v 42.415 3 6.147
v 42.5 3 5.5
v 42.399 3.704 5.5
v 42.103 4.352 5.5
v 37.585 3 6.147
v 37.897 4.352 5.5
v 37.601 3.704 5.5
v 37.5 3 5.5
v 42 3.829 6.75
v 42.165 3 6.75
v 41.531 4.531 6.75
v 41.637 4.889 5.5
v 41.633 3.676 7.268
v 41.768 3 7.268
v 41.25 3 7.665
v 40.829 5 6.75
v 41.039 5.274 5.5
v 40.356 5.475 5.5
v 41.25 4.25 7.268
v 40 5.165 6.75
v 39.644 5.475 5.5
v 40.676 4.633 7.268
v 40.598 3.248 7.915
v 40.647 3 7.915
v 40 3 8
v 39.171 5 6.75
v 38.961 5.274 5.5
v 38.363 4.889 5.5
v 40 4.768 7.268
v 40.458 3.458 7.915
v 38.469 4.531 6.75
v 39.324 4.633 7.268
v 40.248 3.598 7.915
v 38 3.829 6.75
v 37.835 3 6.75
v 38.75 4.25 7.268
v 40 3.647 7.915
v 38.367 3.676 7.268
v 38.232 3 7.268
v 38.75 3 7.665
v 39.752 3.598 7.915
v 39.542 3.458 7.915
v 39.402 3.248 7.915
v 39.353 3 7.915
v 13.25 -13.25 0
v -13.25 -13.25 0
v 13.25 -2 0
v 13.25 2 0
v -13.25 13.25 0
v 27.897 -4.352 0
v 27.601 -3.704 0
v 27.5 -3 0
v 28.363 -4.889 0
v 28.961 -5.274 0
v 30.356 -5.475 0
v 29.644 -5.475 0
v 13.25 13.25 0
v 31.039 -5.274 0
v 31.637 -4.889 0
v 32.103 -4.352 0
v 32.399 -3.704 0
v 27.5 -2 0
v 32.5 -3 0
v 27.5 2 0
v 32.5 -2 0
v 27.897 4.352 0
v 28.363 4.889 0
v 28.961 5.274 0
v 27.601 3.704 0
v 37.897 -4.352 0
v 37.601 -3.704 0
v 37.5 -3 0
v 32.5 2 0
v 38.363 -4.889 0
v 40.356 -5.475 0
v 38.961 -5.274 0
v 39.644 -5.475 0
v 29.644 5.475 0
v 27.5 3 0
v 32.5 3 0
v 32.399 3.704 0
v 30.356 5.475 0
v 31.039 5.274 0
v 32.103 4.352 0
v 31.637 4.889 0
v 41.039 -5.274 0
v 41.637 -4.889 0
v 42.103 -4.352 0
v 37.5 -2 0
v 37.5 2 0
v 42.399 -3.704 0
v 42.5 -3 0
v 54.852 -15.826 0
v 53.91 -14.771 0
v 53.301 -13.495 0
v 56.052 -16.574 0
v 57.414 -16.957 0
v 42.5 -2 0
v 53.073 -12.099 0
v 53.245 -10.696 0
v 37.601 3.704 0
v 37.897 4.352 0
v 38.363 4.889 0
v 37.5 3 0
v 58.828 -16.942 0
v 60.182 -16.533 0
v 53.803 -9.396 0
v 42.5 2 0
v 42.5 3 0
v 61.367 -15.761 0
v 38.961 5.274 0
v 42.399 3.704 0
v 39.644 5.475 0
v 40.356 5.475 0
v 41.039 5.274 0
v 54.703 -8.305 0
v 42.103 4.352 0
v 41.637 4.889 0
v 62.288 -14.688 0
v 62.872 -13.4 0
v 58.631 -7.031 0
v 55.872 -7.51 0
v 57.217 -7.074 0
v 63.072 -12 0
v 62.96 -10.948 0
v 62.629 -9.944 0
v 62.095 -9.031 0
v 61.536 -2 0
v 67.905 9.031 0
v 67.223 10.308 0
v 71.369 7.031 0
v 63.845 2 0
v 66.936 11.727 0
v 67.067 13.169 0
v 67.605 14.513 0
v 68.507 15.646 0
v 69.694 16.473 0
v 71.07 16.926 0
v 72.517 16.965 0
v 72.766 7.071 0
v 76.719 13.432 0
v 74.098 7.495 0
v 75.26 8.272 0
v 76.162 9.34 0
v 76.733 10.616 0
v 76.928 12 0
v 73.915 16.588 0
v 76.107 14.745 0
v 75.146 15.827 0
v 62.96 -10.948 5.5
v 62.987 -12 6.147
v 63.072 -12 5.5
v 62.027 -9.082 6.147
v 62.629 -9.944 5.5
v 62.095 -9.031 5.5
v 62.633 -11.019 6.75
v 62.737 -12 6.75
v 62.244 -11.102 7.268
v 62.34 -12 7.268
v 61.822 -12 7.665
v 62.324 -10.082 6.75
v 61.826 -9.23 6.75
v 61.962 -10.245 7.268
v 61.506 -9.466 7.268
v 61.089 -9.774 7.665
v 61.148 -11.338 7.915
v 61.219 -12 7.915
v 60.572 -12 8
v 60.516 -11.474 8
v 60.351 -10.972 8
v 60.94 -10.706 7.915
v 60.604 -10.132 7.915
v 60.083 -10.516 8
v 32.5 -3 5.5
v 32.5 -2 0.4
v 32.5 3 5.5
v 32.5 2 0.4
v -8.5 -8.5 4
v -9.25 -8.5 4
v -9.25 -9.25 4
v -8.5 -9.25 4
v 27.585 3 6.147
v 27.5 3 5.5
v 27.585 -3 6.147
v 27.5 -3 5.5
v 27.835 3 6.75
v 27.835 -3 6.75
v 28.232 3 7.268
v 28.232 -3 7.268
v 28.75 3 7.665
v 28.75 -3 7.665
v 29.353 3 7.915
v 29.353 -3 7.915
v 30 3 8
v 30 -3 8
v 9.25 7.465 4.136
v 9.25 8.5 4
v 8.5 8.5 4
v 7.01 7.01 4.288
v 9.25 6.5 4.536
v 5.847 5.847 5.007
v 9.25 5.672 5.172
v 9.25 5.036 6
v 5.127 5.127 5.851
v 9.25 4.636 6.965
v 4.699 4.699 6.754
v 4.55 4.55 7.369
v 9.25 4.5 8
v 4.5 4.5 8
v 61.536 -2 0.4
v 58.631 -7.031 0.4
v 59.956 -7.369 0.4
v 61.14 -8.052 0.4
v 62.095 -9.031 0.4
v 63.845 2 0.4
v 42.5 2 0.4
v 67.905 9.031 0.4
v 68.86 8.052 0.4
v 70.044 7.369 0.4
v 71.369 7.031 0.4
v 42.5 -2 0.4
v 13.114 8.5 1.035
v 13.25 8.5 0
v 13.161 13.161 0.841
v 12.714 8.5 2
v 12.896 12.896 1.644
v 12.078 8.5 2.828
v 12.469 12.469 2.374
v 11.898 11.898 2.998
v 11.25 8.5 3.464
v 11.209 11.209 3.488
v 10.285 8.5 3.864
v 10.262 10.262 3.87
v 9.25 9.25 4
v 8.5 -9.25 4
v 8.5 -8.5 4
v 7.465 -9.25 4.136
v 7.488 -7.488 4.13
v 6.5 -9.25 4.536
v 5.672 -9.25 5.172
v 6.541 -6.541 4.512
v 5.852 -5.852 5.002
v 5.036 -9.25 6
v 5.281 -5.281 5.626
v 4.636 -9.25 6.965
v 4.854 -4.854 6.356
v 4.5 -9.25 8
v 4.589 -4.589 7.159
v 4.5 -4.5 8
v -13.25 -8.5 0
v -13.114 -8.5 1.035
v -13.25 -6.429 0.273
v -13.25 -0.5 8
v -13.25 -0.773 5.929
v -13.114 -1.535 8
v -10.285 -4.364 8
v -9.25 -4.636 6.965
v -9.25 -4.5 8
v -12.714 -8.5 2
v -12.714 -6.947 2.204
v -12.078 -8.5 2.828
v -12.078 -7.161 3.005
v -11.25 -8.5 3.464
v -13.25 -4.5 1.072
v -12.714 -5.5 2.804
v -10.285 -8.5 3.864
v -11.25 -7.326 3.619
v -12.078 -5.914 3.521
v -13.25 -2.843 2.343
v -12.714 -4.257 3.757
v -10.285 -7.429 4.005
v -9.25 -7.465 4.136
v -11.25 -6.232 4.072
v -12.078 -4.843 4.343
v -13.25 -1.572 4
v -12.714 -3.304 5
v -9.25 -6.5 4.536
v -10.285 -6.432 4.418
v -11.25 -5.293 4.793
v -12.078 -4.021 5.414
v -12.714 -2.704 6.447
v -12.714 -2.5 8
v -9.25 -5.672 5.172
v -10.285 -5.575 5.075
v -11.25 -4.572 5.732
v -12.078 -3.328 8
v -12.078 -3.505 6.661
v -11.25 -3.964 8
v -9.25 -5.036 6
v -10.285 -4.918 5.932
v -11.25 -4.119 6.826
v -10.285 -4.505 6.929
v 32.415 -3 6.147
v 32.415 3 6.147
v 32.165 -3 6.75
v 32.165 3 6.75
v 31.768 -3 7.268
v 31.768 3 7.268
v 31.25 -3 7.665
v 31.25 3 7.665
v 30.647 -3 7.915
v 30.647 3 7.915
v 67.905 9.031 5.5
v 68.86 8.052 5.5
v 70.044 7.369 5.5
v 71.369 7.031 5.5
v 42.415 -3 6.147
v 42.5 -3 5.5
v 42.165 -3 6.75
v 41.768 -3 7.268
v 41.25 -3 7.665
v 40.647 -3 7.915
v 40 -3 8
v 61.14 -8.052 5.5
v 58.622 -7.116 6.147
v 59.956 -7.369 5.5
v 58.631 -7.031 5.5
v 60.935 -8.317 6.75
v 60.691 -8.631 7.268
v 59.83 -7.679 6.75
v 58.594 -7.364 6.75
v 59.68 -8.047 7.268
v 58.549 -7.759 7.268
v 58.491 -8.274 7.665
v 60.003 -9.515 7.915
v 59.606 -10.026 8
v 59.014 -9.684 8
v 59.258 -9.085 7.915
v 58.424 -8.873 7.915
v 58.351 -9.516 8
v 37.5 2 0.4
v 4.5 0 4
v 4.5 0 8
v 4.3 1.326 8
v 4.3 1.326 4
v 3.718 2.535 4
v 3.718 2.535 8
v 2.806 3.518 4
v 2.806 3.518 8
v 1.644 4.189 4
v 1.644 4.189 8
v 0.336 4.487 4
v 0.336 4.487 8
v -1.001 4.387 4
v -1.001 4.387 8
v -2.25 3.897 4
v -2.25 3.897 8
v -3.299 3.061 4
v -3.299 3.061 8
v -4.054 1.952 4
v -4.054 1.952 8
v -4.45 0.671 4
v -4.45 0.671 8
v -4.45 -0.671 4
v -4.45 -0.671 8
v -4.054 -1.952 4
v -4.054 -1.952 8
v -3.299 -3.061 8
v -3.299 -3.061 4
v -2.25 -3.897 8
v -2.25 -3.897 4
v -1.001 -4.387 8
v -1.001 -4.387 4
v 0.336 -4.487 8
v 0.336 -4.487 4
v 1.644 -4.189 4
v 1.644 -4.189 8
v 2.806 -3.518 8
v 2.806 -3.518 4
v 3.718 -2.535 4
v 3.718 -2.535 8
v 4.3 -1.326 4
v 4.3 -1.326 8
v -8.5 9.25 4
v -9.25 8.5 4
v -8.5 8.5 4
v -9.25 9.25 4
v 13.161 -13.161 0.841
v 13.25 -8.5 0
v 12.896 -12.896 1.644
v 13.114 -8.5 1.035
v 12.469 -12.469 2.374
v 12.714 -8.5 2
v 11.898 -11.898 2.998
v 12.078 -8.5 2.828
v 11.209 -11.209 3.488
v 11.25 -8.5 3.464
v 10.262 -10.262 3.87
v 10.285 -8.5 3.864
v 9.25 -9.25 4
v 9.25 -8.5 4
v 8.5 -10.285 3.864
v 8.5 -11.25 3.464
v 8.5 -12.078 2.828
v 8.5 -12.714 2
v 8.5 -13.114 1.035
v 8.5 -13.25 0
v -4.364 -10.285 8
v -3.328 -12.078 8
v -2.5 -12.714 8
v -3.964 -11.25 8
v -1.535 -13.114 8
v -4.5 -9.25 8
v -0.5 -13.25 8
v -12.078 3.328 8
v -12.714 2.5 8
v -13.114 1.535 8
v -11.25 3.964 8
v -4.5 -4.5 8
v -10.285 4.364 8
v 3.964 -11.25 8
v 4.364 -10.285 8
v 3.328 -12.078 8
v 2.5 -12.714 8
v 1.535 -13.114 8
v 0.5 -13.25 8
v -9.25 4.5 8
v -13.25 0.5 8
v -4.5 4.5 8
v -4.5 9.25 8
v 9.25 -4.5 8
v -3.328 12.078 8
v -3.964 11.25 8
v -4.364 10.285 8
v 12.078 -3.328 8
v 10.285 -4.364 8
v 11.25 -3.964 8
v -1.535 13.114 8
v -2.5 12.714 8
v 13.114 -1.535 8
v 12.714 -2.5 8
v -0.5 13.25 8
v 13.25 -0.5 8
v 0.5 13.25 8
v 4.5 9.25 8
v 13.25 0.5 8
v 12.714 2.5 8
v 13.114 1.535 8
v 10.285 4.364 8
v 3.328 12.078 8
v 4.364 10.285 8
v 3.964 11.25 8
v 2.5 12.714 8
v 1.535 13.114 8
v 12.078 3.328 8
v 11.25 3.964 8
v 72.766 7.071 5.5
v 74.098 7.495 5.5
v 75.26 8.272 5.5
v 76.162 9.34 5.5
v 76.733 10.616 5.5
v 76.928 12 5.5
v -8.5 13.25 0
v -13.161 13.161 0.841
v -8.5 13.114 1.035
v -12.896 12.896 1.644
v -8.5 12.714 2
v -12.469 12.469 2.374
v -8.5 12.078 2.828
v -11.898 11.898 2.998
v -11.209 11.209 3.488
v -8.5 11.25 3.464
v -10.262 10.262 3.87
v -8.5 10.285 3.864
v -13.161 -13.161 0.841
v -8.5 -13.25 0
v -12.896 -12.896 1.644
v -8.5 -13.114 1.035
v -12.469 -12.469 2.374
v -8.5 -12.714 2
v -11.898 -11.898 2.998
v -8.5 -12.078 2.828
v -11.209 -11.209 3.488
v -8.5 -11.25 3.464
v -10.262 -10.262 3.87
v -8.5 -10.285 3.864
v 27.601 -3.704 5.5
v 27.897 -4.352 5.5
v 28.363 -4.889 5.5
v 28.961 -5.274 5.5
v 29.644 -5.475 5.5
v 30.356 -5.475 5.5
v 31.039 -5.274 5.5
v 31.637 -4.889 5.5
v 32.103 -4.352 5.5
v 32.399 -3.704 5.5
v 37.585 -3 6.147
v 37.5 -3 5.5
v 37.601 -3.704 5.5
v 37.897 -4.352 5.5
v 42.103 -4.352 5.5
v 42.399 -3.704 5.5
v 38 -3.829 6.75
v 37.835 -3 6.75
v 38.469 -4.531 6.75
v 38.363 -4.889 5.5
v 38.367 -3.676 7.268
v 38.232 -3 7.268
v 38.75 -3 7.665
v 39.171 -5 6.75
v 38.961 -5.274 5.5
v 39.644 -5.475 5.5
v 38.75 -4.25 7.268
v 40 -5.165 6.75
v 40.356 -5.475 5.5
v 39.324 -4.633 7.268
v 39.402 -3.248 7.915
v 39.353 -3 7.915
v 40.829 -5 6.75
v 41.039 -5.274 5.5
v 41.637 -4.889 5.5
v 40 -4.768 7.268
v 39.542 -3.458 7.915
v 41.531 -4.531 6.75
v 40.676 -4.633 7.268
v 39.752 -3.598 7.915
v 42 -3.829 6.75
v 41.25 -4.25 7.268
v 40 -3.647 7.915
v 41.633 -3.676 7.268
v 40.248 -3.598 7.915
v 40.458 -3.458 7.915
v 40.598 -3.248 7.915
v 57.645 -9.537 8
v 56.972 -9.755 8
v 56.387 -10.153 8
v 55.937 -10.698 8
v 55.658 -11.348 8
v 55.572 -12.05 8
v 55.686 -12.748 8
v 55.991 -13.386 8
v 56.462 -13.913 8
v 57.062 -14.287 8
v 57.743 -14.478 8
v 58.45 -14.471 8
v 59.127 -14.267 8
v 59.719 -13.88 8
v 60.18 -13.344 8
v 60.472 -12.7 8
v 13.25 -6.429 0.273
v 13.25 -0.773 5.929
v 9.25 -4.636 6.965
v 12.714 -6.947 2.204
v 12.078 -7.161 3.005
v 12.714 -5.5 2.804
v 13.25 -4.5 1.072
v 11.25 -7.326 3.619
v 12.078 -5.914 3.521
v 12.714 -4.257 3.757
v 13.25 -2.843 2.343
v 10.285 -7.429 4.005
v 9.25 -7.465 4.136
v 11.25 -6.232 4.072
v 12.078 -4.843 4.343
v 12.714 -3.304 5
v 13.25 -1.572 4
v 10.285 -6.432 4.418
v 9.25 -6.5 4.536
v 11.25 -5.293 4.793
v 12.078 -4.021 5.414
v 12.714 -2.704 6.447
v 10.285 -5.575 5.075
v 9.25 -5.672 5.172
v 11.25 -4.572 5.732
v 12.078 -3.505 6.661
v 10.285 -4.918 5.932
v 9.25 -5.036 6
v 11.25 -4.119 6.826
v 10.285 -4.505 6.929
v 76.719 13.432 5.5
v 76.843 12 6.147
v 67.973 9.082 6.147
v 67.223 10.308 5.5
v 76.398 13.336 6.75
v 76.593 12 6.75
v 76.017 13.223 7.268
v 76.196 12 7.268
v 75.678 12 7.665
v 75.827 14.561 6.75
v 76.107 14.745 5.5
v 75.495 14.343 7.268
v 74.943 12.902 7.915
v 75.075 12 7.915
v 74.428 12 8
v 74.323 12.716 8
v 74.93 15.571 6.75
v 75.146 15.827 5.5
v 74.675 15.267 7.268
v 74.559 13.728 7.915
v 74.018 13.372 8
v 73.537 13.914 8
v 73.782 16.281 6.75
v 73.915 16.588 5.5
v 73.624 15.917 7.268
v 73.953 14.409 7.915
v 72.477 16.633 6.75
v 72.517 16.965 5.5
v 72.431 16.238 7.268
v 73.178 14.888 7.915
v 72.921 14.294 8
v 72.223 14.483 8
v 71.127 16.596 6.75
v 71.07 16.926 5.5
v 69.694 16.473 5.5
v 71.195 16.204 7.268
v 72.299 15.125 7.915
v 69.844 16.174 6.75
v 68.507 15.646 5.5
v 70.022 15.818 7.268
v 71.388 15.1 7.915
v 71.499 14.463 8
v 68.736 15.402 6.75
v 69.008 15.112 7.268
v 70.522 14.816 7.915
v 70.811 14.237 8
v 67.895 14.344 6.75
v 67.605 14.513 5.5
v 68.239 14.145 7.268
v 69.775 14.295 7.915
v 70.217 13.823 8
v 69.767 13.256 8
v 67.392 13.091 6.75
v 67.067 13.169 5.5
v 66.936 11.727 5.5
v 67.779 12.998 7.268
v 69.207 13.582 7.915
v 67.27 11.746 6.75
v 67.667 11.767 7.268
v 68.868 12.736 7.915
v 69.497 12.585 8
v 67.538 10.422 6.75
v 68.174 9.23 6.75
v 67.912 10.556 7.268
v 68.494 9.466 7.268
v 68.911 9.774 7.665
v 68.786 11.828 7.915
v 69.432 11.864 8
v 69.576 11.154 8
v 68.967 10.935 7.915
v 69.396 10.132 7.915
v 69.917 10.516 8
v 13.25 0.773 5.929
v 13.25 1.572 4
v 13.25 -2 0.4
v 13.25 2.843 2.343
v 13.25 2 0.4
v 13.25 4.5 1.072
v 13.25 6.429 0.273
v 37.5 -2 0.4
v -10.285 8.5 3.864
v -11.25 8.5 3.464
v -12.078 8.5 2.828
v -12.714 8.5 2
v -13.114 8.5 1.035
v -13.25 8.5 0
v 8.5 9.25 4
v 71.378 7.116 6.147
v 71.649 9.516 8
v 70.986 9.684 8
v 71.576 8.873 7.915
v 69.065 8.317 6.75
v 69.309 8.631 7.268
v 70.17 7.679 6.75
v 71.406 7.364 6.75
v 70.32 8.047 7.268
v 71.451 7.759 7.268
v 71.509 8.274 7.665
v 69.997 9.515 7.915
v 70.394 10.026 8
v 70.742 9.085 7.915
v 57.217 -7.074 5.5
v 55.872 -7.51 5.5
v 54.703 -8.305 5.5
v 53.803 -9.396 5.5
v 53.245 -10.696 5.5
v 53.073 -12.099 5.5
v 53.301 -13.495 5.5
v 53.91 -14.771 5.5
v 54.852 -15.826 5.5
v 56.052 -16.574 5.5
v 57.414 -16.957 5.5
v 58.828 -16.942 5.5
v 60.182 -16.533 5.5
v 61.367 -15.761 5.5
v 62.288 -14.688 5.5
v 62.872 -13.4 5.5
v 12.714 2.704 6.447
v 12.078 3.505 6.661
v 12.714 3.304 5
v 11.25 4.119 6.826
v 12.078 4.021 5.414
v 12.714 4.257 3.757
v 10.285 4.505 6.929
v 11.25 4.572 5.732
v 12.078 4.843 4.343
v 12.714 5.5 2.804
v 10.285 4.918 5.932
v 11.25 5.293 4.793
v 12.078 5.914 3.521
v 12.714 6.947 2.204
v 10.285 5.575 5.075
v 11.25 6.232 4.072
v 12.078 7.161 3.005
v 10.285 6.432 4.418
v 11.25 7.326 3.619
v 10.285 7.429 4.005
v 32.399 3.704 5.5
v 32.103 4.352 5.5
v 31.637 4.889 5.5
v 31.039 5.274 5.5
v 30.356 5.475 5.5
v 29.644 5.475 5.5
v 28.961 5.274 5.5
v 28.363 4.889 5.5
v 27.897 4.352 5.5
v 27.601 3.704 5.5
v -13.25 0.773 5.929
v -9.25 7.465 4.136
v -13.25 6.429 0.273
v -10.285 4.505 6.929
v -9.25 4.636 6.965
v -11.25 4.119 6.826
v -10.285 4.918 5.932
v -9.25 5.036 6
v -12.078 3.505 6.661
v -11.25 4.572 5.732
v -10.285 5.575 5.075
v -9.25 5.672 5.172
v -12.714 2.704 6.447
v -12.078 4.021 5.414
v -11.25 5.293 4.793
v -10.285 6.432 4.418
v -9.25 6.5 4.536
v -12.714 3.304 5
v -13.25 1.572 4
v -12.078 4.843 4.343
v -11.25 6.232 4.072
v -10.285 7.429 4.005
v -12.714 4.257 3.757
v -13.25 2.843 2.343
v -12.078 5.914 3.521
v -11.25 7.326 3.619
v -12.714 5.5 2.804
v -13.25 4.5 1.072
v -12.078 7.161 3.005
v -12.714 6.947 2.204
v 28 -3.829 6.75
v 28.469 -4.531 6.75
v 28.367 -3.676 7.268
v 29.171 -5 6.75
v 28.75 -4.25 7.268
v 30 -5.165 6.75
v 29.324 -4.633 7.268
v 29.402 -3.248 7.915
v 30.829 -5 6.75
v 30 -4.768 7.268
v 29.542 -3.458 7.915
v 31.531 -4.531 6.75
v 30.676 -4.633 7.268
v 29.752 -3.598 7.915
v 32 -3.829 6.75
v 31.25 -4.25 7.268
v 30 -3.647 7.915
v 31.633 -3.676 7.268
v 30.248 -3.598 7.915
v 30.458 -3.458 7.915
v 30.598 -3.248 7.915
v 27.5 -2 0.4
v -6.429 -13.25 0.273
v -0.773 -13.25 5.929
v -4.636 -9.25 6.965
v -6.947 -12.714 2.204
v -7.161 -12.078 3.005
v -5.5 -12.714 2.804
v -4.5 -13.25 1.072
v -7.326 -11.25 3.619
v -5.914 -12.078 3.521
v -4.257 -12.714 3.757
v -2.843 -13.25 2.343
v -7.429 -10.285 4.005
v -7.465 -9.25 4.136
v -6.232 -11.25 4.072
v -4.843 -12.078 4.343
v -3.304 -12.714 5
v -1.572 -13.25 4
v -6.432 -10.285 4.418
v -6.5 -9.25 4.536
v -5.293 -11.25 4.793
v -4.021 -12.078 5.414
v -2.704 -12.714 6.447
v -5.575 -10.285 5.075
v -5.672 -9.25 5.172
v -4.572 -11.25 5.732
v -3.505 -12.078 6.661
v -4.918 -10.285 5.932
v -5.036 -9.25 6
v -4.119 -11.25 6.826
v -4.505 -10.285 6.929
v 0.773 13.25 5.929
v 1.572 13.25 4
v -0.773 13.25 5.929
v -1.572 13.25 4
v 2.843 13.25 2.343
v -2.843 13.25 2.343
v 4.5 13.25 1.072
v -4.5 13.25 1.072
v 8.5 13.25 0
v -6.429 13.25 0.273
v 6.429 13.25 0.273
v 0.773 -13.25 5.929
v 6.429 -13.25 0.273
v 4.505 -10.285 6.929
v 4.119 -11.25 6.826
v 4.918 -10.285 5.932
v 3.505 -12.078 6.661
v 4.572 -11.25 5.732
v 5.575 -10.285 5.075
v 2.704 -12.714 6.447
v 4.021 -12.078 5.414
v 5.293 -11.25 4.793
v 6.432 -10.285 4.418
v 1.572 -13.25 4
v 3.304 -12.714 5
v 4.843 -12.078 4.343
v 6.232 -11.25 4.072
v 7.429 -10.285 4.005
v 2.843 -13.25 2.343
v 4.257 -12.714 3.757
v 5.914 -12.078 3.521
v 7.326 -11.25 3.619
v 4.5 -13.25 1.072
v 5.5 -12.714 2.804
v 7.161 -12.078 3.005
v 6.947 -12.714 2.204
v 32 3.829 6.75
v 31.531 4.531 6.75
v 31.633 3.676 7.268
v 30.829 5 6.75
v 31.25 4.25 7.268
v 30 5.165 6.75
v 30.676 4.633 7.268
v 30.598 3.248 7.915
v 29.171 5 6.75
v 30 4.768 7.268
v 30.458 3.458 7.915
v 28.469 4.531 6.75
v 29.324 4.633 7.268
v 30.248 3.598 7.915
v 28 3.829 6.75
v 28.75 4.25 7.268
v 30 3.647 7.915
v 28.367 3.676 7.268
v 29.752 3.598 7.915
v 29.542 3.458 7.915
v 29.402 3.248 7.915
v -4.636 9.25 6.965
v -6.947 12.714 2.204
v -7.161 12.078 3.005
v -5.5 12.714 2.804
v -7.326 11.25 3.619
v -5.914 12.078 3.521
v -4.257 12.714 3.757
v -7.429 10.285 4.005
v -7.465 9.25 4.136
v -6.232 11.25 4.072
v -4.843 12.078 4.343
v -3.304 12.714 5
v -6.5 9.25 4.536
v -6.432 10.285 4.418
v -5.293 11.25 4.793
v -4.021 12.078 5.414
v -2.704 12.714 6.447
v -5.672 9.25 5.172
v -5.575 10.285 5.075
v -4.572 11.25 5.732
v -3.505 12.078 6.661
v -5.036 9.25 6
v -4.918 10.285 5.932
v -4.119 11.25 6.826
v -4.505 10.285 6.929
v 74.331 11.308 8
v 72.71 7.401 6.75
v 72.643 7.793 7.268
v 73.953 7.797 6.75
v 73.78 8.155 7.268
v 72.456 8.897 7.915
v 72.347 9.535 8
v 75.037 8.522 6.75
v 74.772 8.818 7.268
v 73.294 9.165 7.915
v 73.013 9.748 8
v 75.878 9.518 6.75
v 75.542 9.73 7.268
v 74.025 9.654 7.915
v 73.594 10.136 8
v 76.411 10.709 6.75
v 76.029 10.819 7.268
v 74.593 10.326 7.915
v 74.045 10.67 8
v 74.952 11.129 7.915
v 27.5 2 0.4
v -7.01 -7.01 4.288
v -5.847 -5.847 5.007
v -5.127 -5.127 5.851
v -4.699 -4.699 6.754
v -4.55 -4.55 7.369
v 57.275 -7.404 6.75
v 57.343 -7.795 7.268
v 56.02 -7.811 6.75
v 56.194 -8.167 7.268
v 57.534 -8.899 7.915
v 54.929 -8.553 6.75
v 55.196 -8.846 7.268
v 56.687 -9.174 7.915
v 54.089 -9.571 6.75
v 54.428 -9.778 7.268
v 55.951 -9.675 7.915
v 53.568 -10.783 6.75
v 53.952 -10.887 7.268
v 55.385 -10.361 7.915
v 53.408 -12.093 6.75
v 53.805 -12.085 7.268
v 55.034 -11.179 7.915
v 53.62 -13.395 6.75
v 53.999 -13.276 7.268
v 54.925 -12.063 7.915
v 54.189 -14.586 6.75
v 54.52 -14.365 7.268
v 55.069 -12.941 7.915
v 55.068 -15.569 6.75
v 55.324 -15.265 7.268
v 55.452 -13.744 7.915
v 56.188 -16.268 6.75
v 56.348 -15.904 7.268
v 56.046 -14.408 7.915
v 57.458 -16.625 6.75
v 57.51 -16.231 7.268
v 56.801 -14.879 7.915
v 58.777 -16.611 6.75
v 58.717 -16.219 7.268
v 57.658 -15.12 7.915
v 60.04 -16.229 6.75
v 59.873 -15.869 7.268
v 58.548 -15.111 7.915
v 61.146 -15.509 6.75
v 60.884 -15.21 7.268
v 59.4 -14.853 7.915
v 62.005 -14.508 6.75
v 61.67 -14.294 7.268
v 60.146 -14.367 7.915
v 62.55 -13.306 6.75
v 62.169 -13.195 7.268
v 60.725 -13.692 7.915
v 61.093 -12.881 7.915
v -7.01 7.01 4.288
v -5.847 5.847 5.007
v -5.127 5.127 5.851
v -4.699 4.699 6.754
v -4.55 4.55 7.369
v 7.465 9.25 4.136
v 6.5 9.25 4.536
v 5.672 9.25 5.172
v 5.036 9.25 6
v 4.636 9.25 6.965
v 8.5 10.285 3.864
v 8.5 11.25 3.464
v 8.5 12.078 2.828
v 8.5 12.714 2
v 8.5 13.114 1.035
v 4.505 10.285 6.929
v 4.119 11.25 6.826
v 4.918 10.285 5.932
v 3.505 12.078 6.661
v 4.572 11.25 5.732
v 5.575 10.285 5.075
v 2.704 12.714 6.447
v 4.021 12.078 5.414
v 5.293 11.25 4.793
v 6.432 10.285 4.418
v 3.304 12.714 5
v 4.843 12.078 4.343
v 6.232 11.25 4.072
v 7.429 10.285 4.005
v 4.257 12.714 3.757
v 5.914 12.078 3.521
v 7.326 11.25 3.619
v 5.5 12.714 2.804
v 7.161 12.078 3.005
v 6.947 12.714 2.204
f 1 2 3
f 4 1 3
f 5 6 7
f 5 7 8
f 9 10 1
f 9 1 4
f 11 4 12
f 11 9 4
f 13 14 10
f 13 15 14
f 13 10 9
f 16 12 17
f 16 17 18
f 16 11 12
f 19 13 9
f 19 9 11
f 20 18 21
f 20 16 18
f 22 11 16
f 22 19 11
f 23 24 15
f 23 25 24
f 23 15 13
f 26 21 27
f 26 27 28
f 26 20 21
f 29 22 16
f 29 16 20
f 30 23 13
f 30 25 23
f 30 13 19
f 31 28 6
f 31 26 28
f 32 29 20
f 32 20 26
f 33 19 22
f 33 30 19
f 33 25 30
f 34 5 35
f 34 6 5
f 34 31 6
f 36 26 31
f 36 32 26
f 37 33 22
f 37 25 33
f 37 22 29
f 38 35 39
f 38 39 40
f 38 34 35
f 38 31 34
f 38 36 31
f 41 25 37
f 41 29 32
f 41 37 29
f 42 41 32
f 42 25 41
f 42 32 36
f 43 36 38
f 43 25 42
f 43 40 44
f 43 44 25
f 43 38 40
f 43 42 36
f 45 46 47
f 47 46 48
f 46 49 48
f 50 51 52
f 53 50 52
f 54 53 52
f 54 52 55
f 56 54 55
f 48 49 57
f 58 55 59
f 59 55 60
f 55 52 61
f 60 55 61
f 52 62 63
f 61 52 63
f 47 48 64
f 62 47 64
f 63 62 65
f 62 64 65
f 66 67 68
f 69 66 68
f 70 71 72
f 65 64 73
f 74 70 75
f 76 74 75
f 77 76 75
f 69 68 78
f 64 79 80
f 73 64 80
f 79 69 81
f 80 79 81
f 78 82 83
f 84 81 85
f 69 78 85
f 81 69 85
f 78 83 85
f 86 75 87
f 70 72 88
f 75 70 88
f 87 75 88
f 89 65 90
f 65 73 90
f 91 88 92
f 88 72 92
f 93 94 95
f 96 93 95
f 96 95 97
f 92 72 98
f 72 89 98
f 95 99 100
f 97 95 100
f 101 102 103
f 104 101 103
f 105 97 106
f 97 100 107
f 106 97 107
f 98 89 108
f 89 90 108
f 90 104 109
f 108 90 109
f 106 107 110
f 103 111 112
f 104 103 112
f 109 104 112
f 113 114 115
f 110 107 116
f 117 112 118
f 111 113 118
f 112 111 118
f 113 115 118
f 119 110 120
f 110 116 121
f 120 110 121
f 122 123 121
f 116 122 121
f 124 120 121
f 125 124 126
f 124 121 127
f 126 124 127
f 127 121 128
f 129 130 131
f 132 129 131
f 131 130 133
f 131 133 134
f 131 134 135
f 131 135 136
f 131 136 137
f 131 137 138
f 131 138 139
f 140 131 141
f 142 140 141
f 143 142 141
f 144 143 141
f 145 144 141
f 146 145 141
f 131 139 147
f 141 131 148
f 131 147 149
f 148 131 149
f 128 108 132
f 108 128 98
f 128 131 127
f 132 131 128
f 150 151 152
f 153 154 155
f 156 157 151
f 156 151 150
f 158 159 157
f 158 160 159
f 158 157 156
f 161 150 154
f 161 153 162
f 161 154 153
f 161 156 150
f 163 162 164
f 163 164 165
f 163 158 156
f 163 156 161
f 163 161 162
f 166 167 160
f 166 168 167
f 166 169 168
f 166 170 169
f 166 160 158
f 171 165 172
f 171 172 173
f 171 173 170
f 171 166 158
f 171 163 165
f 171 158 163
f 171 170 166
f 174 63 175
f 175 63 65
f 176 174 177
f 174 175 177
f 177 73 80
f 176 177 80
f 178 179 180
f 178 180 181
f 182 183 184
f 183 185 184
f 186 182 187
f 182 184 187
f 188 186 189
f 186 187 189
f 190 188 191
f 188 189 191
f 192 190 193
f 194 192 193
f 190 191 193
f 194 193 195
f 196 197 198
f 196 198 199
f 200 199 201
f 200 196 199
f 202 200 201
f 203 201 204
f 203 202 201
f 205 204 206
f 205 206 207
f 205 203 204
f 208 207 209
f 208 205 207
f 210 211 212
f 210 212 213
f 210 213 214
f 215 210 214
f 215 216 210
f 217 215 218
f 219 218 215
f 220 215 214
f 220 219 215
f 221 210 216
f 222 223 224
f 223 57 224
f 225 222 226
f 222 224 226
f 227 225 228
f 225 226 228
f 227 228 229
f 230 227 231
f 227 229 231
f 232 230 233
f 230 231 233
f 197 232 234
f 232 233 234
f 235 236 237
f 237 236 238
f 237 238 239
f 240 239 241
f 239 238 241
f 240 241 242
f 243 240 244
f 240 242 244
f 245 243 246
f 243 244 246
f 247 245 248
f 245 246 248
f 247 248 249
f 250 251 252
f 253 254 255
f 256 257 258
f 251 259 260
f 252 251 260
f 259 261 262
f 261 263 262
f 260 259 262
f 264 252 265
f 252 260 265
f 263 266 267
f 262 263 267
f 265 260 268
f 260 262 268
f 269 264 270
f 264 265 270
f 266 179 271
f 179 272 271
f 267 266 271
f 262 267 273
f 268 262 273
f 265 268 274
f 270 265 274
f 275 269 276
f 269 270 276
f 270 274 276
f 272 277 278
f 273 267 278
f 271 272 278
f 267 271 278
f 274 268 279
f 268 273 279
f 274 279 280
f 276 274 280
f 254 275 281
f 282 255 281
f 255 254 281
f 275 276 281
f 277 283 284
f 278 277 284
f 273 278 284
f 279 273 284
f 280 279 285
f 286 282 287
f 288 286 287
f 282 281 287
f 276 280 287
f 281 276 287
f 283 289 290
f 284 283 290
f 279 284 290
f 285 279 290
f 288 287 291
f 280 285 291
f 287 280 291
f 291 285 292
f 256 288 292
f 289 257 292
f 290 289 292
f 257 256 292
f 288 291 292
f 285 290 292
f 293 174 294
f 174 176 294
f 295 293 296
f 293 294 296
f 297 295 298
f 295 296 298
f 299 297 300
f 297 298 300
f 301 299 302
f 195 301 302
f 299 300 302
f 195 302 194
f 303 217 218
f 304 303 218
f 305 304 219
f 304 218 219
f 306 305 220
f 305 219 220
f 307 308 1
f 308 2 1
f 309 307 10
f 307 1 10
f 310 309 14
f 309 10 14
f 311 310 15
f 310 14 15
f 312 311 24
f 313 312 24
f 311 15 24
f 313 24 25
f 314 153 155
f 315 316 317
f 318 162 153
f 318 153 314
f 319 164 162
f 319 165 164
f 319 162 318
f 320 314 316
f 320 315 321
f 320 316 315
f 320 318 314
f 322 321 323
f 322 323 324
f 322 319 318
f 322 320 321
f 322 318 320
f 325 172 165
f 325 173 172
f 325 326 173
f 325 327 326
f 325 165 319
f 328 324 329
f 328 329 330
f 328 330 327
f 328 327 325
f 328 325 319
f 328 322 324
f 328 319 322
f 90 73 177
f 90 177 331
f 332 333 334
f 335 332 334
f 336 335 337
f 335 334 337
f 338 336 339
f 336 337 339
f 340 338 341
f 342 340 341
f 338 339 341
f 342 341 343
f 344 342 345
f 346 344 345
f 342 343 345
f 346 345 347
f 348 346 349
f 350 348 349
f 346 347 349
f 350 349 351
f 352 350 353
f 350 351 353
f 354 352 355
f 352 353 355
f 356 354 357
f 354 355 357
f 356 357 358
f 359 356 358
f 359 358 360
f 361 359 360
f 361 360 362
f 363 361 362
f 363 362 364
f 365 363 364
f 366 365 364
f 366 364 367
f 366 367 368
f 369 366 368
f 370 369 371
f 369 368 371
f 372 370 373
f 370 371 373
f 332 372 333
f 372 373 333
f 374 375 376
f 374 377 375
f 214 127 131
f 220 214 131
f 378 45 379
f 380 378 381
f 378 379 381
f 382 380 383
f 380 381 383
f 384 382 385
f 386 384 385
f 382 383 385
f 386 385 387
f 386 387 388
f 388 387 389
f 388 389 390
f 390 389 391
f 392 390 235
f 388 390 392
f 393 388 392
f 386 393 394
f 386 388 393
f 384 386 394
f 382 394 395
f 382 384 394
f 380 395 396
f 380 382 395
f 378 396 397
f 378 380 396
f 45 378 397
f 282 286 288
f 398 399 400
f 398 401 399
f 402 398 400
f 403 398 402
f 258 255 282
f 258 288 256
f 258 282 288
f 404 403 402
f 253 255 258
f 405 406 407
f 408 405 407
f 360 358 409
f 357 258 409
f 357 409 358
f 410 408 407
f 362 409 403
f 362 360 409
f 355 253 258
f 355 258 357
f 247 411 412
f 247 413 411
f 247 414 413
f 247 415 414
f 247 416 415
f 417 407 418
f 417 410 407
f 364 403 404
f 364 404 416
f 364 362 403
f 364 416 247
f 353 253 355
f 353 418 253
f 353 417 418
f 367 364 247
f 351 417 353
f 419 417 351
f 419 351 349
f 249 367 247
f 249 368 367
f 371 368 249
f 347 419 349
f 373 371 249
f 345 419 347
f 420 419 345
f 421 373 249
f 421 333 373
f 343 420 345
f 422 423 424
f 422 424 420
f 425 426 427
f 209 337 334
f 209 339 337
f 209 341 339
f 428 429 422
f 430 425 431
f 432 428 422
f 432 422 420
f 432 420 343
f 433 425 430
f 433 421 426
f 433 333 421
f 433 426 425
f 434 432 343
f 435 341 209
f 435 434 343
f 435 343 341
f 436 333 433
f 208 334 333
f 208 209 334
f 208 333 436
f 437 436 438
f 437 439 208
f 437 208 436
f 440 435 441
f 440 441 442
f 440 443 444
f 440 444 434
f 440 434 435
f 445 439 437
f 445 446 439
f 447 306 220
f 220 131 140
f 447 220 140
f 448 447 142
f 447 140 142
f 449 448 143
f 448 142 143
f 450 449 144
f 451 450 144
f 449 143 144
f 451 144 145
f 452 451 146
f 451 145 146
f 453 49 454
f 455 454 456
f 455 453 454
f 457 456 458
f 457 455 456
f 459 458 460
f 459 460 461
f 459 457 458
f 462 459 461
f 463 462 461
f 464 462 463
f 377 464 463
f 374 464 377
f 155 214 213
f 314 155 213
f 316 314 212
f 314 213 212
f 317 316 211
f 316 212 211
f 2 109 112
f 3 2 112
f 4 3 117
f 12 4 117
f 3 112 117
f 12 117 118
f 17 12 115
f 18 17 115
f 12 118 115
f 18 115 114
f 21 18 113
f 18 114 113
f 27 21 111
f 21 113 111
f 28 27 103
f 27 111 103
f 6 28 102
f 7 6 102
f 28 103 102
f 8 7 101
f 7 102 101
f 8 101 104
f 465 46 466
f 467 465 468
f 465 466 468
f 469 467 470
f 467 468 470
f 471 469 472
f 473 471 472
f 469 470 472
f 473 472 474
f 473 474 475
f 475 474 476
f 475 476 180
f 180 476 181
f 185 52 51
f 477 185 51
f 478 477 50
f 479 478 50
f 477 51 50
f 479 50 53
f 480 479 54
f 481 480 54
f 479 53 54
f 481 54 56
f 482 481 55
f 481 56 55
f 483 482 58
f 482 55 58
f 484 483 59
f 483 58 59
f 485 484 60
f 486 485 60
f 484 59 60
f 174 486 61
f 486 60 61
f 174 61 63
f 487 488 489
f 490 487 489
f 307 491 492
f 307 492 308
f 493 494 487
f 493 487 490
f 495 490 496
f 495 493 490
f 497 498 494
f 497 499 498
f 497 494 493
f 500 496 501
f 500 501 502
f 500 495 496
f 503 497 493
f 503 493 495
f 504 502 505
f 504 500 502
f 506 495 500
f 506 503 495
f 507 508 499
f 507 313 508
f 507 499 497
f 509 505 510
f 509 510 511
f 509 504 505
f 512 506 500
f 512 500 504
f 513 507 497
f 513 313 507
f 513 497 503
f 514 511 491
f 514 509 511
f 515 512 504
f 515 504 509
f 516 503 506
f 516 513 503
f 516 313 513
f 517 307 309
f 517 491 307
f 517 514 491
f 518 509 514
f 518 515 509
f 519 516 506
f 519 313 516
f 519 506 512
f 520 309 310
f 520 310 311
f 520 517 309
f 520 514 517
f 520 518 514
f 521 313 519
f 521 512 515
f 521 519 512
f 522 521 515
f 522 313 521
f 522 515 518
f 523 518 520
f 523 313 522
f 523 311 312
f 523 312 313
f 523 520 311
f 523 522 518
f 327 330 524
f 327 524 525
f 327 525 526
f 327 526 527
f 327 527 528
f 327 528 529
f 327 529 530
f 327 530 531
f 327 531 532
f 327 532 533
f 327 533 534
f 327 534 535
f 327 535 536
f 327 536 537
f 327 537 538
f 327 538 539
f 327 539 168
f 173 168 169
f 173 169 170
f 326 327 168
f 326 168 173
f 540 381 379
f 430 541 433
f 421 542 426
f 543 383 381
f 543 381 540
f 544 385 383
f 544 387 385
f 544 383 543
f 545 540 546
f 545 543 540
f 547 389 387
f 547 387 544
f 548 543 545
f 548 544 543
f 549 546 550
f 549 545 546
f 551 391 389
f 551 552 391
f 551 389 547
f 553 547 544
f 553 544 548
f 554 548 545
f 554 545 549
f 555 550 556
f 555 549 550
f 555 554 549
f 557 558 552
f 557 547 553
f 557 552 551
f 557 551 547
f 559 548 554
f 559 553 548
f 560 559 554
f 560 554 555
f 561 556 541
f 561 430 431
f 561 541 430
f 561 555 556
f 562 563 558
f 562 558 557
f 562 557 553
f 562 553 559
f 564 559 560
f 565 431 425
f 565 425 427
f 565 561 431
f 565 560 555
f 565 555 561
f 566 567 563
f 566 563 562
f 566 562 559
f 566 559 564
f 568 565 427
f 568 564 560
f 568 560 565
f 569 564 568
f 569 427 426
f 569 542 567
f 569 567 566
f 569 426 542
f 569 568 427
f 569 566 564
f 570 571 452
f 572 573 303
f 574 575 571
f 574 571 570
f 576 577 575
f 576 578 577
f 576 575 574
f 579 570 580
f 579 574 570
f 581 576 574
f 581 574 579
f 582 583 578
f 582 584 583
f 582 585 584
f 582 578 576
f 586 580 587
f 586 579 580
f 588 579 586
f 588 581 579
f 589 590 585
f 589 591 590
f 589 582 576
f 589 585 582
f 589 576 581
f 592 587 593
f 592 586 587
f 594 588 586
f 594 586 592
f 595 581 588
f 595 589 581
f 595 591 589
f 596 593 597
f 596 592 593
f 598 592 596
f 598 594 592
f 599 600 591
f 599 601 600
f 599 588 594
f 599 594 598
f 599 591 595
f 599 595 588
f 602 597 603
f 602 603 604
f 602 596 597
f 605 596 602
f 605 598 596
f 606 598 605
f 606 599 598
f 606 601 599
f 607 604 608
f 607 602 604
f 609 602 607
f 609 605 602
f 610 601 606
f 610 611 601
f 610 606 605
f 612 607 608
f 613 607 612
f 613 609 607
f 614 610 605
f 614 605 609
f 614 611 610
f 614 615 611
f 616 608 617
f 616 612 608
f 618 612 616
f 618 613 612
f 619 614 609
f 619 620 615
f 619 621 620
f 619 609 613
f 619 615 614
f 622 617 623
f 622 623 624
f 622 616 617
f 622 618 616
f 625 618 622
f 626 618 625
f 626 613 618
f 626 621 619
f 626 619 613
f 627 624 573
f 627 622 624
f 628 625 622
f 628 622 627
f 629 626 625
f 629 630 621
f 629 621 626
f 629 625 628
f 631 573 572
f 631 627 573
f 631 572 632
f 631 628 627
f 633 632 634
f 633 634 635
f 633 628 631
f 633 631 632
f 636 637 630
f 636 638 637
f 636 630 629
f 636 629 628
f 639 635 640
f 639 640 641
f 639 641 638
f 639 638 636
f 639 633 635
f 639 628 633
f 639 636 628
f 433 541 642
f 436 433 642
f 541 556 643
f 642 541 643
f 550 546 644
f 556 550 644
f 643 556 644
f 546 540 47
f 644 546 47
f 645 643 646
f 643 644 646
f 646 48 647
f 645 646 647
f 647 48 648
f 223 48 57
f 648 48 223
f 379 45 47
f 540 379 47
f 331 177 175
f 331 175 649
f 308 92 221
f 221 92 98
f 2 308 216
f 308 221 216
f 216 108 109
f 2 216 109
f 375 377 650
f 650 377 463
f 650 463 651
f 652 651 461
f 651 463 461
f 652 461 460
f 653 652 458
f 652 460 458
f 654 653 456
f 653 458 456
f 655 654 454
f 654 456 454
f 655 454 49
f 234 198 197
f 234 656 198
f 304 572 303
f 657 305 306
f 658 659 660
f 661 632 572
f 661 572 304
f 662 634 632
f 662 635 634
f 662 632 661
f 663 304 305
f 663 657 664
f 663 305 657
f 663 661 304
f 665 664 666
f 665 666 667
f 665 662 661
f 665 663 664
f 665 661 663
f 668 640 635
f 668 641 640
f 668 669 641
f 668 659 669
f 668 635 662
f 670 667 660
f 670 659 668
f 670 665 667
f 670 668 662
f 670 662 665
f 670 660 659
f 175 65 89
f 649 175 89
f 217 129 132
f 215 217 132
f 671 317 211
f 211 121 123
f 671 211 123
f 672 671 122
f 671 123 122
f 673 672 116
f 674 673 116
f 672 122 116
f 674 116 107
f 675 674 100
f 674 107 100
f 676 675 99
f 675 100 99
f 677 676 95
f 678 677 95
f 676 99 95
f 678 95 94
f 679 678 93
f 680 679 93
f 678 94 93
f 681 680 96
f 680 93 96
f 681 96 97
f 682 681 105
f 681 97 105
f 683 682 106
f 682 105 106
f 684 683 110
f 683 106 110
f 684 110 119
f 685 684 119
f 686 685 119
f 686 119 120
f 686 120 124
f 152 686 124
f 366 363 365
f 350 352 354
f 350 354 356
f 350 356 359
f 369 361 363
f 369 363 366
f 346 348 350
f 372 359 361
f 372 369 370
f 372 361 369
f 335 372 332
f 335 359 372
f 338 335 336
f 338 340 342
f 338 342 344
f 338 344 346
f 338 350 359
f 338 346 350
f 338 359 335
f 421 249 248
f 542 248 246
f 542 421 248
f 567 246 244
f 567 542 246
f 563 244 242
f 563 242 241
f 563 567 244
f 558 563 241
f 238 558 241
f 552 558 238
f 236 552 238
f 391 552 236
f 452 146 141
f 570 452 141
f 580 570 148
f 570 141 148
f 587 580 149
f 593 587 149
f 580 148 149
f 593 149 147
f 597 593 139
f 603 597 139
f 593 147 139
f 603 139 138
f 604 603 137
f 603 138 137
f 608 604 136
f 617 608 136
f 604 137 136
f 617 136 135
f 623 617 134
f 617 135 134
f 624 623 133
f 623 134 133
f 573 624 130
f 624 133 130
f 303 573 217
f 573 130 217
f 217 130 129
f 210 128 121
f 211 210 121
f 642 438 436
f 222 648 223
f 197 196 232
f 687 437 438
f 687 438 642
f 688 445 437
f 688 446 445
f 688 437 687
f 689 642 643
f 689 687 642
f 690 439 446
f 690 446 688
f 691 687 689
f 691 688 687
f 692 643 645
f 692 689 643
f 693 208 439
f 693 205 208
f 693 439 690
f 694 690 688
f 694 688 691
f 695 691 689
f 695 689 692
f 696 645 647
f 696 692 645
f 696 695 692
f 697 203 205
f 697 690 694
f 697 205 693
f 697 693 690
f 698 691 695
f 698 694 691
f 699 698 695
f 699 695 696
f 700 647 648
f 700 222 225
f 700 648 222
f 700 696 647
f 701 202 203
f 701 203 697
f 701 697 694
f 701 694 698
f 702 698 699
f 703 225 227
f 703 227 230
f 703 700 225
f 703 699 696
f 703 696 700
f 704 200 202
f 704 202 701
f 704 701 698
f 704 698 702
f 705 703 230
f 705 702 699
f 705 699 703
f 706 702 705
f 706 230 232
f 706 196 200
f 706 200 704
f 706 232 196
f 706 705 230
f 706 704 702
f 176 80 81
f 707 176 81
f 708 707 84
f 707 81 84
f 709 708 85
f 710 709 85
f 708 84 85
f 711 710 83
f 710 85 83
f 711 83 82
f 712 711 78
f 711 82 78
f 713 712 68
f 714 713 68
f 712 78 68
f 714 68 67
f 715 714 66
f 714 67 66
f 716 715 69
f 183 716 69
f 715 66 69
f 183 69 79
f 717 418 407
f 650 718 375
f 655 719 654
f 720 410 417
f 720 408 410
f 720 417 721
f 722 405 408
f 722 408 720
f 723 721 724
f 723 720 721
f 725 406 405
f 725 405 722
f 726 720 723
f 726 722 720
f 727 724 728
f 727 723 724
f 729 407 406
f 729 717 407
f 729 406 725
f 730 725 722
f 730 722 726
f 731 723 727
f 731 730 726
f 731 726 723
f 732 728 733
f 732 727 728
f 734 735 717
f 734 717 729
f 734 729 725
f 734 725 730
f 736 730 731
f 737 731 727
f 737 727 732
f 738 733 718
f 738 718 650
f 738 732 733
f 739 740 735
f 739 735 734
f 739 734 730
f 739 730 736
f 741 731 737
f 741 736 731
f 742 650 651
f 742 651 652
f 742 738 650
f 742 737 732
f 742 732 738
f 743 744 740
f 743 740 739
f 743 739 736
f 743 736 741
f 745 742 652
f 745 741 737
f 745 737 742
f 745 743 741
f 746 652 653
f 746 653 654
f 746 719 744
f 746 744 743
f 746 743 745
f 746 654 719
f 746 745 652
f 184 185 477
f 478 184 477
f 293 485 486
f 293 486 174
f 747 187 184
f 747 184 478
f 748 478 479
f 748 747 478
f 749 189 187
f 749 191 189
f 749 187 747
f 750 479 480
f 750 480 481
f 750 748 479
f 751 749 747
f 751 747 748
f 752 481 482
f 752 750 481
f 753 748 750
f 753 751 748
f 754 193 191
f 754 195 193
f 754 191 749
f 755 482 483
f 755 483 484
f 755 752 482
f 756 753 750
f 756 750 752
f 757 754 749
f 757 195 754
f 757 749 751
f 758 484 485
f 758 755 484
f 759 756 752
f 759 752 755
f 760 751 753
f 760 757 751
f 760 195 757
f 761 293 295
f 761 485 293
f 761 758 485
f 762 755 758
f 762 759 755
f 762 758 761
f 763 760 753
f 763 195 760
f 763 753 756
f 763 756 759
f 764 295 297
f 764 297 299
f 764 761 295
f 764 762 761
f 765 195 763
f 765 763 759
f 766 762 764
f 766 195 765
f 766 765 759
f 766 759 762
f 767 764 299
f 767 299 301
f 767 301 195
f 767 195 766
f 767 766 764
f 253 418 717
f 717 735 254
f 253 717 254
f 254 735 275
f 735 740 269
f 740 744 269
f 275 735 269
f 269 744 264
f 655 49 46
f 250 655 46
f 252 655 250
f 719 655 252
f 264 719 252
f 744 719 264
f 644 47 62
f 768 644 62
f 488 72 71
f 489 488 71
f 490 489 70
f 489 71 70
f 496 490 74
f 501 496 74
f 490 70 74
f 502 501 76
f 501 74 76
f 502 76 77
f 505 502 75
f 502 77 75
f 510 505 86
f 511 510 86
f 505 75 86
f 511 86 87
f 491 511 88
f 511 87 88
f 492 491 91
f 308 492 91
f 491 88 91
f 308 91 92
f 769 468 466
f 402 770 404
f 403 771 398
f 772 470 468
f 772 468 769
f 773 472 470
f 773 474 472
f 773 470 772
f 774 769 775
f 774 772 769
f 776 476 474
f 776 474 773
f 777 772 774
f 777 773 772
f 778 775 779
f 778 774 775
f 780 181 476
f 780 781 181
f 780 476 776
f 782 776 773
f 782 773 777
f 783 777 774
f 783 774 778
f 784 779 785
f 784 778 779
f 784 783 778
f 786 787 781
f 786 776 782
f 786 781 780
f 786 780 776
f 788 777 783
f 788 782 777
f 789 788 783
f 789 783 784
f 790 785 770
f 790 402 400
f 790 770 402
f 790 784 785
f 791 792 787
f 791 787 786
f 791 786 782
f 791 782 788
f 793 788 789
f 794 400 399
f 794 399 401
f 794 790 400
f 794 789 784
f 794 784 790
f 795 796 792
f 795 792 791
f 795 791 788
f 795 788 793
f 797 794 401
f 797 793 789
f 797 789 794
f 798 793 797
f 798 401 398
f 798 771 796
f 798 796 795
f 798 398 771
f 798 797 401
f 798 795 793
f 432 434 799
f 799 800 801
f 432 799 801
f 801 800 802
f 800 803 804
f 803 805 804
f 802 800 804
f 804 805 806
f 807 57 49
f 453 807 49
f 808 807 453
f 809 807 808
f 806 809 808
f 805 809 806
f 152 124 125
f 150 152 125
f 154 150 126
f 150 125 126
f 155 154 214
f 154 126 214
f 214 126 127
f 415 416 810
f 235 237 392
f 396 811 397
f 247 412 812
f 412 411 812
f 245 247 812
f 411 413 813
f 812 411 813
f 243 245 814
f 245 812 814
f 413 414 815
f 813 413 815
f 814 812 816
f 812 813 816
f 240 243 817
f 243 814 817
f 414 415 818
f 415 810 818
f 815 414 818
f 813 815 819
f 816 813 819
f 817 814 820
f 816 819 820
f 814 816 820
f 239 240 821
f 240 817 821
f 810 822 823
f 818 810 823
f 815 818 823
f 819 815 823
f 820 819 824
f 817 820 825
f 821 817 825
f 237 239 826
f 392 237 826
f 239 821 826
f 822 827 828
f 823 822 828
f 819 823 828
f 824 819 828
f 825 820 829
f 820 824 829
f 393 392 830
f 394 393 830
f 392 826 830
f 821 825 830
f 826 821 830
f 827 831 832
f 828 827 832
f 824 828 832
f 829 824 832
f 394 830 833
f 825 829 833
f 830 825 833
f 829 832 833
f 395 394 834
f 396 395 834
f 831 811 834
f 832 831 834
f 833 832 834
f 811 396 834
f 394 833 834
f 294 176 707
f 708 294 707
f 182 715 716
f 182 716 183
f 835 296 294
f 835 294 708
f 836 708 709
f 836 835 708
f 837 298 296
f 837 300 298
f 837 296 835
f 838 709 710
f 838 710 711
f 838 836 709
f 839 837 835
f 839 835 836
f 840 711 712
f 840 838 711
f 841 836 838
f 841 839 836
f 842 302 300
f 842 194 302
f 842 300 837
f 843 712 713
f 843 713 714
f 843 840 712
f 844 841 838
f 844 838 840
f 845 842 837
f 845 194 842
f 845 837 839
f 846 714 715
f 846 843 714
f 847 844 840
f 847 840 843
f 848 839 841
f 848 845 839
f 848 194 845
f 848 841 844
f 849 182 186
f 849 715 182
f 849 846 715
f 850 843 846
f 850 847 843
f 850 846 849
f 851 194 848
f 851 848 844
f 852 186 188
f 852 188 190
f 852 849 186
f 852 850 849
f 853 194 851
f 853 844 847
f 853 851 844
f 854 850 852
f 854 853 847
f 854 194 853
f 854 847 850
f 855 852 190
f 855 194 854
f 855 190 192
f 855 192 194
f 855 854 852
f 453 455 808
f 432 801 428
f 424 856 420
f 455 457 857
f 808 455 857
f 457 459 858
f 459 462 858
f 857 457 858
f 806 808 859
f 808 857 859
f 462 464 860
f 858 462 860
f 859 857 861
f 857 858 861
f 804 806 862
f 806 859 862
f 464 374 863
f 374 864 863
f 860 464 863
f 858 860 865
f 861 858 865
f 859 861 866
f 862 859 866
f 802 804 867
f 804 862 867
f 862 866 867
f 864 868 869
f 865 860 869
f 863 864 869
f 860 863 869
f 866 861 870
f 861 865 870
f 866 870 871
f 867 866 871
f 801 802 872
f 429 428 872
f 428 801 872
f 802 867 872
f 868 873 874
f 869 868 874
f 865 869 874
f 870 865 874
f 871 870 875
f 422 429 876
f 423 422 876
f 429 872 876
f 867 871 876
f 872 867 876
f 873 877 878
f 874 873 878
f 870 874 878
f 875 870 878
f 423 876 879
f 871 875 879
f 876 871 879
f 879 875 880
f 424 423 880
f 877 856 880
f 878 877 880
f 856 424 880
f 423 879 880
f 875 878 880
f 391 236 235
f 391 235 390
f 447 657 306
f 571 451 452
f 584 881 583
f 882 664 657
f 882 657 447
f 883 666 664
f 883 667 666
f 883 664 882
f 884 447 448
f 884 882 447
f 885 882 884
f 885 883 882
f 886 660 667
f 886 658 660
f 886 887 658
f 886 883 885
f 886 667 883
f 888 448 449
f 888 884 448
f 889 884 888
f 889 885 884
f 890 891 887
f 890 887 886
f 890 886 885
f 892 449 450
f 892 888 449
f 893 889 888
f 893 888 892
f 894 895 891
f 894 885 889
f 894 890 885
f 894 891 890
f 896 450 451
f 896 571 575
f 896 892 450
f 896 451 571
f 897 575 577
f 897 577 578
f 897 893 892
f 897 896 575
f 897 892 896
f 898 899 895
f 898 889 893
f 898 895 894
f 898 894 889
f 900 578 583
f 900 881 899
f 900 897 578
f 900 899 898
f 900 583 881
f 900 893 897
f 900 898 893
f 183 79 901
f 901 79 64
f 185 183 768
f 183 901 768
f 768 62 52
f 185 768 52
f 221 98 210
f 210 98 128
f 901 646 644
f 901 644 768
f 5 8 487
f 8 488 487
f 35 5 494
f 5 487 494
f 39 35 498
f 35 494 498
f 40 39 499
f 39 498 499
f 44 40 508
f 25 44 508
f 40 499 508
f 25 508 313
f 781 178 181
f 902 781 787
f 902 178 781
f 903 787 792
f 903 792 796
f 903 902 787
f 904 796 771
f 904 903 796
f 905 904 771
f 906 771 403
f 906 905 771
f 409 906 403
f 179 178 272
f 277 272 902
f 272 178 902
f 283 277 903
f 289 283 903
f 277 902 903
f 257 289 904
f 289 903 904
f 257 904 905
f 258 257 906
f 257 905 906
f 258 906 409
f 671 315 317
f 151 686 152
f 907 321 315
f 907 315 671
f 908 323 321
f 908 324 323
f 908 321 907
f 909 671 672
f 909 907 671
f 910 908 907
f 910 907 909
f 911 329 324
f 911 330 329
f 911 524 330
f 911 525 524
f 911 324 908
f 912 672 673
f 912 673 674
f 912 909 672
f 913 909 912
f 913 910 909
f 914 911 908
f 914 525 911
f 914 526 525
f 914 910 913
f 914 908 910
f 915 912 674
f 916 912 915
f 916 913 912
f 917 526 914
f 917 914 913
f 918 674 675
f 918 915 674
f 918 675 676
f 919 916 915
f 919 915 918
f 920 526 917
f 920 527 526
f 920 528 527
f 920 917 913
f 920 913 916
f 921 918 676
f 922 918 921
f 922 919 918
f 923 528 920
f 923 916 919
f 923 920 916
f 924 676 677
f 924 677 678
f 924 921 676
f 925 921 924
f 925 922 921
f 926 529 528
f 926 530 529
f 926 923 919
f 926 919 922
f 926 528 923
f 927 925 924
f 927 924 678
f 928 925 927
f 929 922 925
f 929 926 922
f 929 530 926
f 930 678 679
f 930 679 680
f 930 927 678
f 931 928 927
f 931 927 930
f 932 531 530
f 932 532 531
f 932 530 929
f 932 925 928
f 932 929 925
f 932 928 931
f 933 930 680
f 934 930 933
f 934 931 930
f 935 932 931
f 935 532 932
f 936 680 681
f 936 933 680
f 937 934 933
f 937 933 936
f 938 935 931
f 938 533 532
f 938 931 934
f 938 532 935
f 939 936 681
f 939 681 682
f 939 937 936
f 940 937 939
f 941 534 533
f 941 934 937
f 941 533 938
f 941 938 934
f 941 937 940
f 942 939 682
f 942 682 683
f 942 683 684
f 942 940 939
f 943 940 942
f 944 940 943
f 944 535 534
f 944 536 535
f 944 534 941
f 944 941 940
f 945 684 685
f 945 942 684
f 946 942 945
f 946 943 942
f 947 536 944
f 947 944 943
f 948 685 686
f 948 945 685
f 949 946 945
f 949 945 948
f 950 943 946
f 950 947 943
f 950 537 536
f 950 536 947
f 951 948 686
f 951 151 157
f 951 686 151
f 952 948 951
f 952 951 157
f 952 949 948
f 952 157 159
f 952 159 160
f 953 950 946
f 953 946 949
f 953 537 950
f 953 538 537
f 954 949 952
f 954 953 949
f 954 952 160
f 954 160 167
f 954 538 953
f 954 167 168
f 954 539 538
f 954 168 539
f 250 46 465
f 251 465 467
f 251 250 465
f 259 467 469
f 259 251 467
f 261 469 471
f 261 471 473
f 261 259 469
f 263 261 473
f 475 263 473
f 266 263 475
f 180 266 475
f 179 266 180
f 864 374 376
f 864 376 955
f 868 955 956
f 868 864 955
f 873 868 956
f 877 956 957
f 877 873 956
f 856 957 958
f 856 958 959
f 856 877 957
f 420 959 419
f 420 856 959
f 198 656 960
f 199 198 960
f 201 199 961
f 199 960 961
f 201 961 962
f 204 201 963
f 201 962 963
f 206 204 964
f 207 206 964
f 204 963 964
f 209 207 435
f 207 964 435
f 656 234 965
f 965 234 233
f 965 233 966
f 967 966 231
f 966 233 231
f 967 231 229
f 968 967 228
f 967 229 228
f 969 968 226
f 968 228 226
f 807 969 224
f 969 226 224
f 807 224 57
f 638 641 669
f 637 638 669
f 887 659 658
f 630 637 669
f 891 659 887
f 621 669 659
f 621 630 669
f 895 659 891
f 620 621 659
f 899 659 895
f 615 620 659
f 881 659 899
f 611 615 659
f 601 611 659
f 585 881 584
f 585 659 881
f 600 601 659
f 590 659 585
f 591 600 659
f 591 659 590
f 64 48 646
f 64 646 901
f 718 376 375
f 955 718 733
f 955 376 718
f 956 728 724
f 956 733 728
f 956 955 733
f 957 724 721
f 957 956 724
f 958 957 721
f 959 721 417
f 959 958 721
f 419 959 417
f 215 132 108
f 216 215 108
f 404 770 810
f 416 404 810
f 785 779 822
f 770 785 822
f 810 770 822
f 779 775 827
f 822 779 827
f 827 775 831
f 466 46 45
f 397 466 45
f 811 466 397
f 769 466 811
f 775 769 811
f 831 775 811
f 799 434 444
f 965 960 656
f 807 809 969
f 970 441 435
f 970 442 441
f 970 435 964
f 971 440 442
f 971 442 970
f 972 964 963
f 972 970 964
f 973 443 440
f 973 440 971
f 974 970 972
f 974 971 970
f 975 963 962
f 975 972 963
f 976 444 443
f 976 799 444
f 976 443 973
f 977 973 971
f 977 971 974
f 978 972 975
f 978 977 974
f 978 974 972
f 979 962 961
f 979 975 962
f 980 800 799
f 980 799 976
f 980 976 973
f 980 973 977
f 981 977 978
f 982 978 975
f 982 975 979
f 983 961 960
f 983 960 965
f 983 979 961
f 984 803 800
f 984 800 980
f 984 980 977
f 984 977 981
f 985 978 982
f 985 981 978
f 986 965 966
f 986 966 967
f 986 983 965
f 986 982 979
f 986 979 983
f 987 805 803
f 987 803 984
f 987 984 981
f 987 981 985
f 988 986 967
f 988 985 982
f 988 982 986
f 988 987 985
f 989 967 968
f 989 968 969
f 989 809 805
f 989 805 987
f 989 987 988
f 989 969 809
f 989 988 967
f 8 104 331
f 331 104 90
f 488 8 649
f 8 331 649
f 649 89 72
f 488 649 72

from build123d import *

# Parameters (mm, degrees)
F1_DEPTH = 8
F0_W     = 14.25
F0_H     = 4
F0_W_2   = 5
F2_DEPTH = 0.4
F3_R     = 2.49999
F4_R     = 4.5
F4_W     = 8.75
F4_H     = 8.75
F5_DEPTH = 4
F6_F1_R  = 3.9999
F6_F2_R  = 3.9999


# Not quite as in the source:
# - a fillet or chamfer is up to 0.001 mm smaller than in the source, because OpenCascade refuses the exact size


with BuildPart() as f1:
    # F0 (on Top) → F1 (new body)
    with BuildSketch(Plane.XY):
        Polygon((13.25, 2), (13.25, 13.25), (-13.25, 13.25), (-13.25, -13.25), (13.25, -13.25), (13.25, -2), align=None)
    extrude(amount=F1_DEPTH)



with BuildPart() as f1b:
    # F0 (on Top) → F1, piece 2 (new body)
    with BuildSketch(Plane.XY):
        Polygon((27.5, 3), (27.5, 2), (27.5, -2), (27.5, -3), (32.5, -3), (32.5, -2), (32.5, 2), (32.5, 3), align=None)
        with BuildLine():
            ThreePointArc((32.5, 3), (30, 5.5), (27.5, 3))
            Line((27.5, 3), (32.5, 3))
        make_face()
        with BuildLine():
            Line((32.5, -3), (27.5, -3))
            ThreePointArc((27.5, -3), (30, -5.5), (32.5, -3))
        make_face()
    extrude(amount=F1_DEPTH)


with BuildPart() as f1c:
    # F0 (on Top) → F1, piece 3 (new body)
    with BuildSketch(Plane.XY):
        with BuildLine():
            ThreePointArc((42.5, 3), (40, 5.5), (37.5, 3))
            Line((37.5, 3), (42.5, 3))
        make_face()
        Polygon((37.5, 3), (37.5, 2), (37.5, -2), (37.5, -3), (42.5, -3), (42.5, -2), (42.5, 2), (42.5, 3), align=None)
        with BuildLine():
            Line((42.5, -3), (37.5, -3))
            ThreePointArc((37.5, -3), (40, -5.5), (42.5, -3))
        make_face()
    extrude(amount=F1_DEPTH)


with BuildPart() as f1d:
    # F0 (on Top) → F1, piece 4 (new body)
    with BuildSketch(Plane.XY):
        with BuildLine():
            ThreePointArc((62.0951354248, -9.0313730334), (60.5717967697, -7.6698729811), (58.6310338096, -7.0313730334))
            ThreePointArc((58.6310338096, -7.0313730334), (54.3437822043, -15.3319524907), (63.0717967697, -12))
            ThreePointArc((63.0717967697, -12), (62.8213595536, -10.437420926), (62.0951354248, -9.0313730334))
        make_face()
    extrude(amount=F1_DEPTH)


with BuildPart() as f1e:
    # F0 (on Top) → F1, piece 5 (new body)
    with BuildSketch(Plane.XY):
        with BuildLine():
            ThreePointArc((76.9282032303, 12), (70.3656241563, 16.7495627838), (67.9048645752, 9.0313730334))
            ThreePointArc((67.9048645752, 9.0313730334), (69.4282032303, 7.6698729811), (71.3689661904, 7.0313730334))
            ThreePointArc((71.3689661904, 7.0313730334), (75.260155721, 8.2719854346), (76.9282032303, 12))
        make_face()
    extrude(amount=F1_DEPTH)


with BuildPart() as f1_1:
    add(f1.part)

    add(f1b.part)  # F2 merges F1b

    add(f1c.part)  # F2 merges F1c

    add(f1d.part)  # F2 merges F1d

    add(f1e.part)  # F2 merges F1e
    # F0 (on Top) → F2 (join)
    with BuildSketch(Plane.XY):
        with Locations((20.375, 0)):
            Rectangle(F0_W, F0_H)
        with Locations((35, 0)):
            Rectangle(F0_W_2, F0_H)
        Polygon((63.8452994616, 2), (42.5, 2), (42.5, -2), (61.5358983849, -2), align=None)
        with BuildLine():
            Line((67.9048645752, 9.0313730334), (63.8452994616, 2))
            Line((63.8452994616, 2), (61.5358983849, -2))
            Line((61.5358983849, -2), (58.6310338096, -7.0313730334))
            ThreePointArc((58.6310338096, -7.0313730334), (60.5717967697, -7.6698729811), (62.0951354248, -9.0313730334))
            Line((62.0951354248, -9.0313730334), (71.3689661904, 7.0313730334))
            ThreePointArc((71.3689661904, 7.0313730334), (69.4282032303, 7.6698729811), (67.9048645752, 9.0313730334))
        make_face()
    extrude(amount=F2_DEPTH)

    # F3 (radius 2.5 in the source; OpenCascade refuses exactly that, so slightly less here)
    f3_edges = [f1_1.edges().sort_by_distance(p)[0] for p in [
        (53.071797, -12, 8),
        (75.951542, 14.968627, 8),
        (42.5, 0, 8),
        (27.5, 0, 8),
        (30, -5.5, 8),
        (32.5, 0, 8),
        (30, 5.5, 8),
        (40, 5.5, 8),
        (37.5, 0, 8),
        (40, -5.5, 8),
    ]]
    fillet(f3_edges, radius=F3_R)

    # F4 (on face) → F5 (cut)
    with BuildSketch(Plane.XY.offset(8)):
        Circle(F4_R)
        with Locations((8.875, 8.875)):
            Rectangle(F4_W, F4_H)
        with Locations((-8.875, 8.875)):
            Rectangle(F4_W, F4_H)
        with Locations((-8.875, -8.875)):
            Rectangle(F4_W, F4_H)
        with Locations((8.875, -8.875)):
            Rectangle(F4_W, F4_H)
    extrude(amount=-F5_DEPTH, mode=Mode.SUBTRACT)

    # F6: fillet of radius 4 on 16 edges, made by hand

    # F6_f1 (radius 4 in the source; OpenCascade refuses exactly that, so slightly less here)
    f6_f1_edges = [f1_1.edges().sort_by_distance(p)[0] for p in [
        (-4.5, 8.875, 4),
        (-8.875, 4.5, 4),
        (4.5, 8.875, 4),
        (8.875, 4.5, 4),
        (-8.875, -4.5, 4),
        (-4.5, -8.875, 4),
        (8.875, -4.5, 4),
        (4.5, -8.875, 4),
    ]]
    fillet(f6_f1_edges, radius=F6_F1_R)

    # F6_f2 (radius 4 in the source; OpenCascade refuses exactly that, so slightly less here)
    f6_f2_edges = [f1_1.edges().sort_by_distance(p)[0] for p in [
        (-10.87495, 13.25, 4),
        (-13.25, 10.87495, 4),
        (13.25, 10.87495, 4),
        (10.87495, 13.25, 4),
        (-13.25, -10.87495, 4),
        (-10.87495, -13.25, 4),
        (13.25, -10.87495, 4),
        (10.87495, -13.25, 4),
        (5.6715435859, -13.25, 5.1715435859),
        (13.25, -5.6715435859, 5.1715435859),
        (-5.6715435859, -13.25, 5.1715435859),
        (-13.25, -5.6715435859, 5.1715435859),
        (5.6715435859, 13.25, 5.1715435859),
        (13.25, 5.6715435859, 5.1715435859),
        (-13.25, 5.6715435859, 5.1715435859),
        (-5.6715435859, 13.25, 5.1715435859),
    ]]
    fillet(f6_f2_edges, radius=F6_F2_R)


solid = f1_1.part
